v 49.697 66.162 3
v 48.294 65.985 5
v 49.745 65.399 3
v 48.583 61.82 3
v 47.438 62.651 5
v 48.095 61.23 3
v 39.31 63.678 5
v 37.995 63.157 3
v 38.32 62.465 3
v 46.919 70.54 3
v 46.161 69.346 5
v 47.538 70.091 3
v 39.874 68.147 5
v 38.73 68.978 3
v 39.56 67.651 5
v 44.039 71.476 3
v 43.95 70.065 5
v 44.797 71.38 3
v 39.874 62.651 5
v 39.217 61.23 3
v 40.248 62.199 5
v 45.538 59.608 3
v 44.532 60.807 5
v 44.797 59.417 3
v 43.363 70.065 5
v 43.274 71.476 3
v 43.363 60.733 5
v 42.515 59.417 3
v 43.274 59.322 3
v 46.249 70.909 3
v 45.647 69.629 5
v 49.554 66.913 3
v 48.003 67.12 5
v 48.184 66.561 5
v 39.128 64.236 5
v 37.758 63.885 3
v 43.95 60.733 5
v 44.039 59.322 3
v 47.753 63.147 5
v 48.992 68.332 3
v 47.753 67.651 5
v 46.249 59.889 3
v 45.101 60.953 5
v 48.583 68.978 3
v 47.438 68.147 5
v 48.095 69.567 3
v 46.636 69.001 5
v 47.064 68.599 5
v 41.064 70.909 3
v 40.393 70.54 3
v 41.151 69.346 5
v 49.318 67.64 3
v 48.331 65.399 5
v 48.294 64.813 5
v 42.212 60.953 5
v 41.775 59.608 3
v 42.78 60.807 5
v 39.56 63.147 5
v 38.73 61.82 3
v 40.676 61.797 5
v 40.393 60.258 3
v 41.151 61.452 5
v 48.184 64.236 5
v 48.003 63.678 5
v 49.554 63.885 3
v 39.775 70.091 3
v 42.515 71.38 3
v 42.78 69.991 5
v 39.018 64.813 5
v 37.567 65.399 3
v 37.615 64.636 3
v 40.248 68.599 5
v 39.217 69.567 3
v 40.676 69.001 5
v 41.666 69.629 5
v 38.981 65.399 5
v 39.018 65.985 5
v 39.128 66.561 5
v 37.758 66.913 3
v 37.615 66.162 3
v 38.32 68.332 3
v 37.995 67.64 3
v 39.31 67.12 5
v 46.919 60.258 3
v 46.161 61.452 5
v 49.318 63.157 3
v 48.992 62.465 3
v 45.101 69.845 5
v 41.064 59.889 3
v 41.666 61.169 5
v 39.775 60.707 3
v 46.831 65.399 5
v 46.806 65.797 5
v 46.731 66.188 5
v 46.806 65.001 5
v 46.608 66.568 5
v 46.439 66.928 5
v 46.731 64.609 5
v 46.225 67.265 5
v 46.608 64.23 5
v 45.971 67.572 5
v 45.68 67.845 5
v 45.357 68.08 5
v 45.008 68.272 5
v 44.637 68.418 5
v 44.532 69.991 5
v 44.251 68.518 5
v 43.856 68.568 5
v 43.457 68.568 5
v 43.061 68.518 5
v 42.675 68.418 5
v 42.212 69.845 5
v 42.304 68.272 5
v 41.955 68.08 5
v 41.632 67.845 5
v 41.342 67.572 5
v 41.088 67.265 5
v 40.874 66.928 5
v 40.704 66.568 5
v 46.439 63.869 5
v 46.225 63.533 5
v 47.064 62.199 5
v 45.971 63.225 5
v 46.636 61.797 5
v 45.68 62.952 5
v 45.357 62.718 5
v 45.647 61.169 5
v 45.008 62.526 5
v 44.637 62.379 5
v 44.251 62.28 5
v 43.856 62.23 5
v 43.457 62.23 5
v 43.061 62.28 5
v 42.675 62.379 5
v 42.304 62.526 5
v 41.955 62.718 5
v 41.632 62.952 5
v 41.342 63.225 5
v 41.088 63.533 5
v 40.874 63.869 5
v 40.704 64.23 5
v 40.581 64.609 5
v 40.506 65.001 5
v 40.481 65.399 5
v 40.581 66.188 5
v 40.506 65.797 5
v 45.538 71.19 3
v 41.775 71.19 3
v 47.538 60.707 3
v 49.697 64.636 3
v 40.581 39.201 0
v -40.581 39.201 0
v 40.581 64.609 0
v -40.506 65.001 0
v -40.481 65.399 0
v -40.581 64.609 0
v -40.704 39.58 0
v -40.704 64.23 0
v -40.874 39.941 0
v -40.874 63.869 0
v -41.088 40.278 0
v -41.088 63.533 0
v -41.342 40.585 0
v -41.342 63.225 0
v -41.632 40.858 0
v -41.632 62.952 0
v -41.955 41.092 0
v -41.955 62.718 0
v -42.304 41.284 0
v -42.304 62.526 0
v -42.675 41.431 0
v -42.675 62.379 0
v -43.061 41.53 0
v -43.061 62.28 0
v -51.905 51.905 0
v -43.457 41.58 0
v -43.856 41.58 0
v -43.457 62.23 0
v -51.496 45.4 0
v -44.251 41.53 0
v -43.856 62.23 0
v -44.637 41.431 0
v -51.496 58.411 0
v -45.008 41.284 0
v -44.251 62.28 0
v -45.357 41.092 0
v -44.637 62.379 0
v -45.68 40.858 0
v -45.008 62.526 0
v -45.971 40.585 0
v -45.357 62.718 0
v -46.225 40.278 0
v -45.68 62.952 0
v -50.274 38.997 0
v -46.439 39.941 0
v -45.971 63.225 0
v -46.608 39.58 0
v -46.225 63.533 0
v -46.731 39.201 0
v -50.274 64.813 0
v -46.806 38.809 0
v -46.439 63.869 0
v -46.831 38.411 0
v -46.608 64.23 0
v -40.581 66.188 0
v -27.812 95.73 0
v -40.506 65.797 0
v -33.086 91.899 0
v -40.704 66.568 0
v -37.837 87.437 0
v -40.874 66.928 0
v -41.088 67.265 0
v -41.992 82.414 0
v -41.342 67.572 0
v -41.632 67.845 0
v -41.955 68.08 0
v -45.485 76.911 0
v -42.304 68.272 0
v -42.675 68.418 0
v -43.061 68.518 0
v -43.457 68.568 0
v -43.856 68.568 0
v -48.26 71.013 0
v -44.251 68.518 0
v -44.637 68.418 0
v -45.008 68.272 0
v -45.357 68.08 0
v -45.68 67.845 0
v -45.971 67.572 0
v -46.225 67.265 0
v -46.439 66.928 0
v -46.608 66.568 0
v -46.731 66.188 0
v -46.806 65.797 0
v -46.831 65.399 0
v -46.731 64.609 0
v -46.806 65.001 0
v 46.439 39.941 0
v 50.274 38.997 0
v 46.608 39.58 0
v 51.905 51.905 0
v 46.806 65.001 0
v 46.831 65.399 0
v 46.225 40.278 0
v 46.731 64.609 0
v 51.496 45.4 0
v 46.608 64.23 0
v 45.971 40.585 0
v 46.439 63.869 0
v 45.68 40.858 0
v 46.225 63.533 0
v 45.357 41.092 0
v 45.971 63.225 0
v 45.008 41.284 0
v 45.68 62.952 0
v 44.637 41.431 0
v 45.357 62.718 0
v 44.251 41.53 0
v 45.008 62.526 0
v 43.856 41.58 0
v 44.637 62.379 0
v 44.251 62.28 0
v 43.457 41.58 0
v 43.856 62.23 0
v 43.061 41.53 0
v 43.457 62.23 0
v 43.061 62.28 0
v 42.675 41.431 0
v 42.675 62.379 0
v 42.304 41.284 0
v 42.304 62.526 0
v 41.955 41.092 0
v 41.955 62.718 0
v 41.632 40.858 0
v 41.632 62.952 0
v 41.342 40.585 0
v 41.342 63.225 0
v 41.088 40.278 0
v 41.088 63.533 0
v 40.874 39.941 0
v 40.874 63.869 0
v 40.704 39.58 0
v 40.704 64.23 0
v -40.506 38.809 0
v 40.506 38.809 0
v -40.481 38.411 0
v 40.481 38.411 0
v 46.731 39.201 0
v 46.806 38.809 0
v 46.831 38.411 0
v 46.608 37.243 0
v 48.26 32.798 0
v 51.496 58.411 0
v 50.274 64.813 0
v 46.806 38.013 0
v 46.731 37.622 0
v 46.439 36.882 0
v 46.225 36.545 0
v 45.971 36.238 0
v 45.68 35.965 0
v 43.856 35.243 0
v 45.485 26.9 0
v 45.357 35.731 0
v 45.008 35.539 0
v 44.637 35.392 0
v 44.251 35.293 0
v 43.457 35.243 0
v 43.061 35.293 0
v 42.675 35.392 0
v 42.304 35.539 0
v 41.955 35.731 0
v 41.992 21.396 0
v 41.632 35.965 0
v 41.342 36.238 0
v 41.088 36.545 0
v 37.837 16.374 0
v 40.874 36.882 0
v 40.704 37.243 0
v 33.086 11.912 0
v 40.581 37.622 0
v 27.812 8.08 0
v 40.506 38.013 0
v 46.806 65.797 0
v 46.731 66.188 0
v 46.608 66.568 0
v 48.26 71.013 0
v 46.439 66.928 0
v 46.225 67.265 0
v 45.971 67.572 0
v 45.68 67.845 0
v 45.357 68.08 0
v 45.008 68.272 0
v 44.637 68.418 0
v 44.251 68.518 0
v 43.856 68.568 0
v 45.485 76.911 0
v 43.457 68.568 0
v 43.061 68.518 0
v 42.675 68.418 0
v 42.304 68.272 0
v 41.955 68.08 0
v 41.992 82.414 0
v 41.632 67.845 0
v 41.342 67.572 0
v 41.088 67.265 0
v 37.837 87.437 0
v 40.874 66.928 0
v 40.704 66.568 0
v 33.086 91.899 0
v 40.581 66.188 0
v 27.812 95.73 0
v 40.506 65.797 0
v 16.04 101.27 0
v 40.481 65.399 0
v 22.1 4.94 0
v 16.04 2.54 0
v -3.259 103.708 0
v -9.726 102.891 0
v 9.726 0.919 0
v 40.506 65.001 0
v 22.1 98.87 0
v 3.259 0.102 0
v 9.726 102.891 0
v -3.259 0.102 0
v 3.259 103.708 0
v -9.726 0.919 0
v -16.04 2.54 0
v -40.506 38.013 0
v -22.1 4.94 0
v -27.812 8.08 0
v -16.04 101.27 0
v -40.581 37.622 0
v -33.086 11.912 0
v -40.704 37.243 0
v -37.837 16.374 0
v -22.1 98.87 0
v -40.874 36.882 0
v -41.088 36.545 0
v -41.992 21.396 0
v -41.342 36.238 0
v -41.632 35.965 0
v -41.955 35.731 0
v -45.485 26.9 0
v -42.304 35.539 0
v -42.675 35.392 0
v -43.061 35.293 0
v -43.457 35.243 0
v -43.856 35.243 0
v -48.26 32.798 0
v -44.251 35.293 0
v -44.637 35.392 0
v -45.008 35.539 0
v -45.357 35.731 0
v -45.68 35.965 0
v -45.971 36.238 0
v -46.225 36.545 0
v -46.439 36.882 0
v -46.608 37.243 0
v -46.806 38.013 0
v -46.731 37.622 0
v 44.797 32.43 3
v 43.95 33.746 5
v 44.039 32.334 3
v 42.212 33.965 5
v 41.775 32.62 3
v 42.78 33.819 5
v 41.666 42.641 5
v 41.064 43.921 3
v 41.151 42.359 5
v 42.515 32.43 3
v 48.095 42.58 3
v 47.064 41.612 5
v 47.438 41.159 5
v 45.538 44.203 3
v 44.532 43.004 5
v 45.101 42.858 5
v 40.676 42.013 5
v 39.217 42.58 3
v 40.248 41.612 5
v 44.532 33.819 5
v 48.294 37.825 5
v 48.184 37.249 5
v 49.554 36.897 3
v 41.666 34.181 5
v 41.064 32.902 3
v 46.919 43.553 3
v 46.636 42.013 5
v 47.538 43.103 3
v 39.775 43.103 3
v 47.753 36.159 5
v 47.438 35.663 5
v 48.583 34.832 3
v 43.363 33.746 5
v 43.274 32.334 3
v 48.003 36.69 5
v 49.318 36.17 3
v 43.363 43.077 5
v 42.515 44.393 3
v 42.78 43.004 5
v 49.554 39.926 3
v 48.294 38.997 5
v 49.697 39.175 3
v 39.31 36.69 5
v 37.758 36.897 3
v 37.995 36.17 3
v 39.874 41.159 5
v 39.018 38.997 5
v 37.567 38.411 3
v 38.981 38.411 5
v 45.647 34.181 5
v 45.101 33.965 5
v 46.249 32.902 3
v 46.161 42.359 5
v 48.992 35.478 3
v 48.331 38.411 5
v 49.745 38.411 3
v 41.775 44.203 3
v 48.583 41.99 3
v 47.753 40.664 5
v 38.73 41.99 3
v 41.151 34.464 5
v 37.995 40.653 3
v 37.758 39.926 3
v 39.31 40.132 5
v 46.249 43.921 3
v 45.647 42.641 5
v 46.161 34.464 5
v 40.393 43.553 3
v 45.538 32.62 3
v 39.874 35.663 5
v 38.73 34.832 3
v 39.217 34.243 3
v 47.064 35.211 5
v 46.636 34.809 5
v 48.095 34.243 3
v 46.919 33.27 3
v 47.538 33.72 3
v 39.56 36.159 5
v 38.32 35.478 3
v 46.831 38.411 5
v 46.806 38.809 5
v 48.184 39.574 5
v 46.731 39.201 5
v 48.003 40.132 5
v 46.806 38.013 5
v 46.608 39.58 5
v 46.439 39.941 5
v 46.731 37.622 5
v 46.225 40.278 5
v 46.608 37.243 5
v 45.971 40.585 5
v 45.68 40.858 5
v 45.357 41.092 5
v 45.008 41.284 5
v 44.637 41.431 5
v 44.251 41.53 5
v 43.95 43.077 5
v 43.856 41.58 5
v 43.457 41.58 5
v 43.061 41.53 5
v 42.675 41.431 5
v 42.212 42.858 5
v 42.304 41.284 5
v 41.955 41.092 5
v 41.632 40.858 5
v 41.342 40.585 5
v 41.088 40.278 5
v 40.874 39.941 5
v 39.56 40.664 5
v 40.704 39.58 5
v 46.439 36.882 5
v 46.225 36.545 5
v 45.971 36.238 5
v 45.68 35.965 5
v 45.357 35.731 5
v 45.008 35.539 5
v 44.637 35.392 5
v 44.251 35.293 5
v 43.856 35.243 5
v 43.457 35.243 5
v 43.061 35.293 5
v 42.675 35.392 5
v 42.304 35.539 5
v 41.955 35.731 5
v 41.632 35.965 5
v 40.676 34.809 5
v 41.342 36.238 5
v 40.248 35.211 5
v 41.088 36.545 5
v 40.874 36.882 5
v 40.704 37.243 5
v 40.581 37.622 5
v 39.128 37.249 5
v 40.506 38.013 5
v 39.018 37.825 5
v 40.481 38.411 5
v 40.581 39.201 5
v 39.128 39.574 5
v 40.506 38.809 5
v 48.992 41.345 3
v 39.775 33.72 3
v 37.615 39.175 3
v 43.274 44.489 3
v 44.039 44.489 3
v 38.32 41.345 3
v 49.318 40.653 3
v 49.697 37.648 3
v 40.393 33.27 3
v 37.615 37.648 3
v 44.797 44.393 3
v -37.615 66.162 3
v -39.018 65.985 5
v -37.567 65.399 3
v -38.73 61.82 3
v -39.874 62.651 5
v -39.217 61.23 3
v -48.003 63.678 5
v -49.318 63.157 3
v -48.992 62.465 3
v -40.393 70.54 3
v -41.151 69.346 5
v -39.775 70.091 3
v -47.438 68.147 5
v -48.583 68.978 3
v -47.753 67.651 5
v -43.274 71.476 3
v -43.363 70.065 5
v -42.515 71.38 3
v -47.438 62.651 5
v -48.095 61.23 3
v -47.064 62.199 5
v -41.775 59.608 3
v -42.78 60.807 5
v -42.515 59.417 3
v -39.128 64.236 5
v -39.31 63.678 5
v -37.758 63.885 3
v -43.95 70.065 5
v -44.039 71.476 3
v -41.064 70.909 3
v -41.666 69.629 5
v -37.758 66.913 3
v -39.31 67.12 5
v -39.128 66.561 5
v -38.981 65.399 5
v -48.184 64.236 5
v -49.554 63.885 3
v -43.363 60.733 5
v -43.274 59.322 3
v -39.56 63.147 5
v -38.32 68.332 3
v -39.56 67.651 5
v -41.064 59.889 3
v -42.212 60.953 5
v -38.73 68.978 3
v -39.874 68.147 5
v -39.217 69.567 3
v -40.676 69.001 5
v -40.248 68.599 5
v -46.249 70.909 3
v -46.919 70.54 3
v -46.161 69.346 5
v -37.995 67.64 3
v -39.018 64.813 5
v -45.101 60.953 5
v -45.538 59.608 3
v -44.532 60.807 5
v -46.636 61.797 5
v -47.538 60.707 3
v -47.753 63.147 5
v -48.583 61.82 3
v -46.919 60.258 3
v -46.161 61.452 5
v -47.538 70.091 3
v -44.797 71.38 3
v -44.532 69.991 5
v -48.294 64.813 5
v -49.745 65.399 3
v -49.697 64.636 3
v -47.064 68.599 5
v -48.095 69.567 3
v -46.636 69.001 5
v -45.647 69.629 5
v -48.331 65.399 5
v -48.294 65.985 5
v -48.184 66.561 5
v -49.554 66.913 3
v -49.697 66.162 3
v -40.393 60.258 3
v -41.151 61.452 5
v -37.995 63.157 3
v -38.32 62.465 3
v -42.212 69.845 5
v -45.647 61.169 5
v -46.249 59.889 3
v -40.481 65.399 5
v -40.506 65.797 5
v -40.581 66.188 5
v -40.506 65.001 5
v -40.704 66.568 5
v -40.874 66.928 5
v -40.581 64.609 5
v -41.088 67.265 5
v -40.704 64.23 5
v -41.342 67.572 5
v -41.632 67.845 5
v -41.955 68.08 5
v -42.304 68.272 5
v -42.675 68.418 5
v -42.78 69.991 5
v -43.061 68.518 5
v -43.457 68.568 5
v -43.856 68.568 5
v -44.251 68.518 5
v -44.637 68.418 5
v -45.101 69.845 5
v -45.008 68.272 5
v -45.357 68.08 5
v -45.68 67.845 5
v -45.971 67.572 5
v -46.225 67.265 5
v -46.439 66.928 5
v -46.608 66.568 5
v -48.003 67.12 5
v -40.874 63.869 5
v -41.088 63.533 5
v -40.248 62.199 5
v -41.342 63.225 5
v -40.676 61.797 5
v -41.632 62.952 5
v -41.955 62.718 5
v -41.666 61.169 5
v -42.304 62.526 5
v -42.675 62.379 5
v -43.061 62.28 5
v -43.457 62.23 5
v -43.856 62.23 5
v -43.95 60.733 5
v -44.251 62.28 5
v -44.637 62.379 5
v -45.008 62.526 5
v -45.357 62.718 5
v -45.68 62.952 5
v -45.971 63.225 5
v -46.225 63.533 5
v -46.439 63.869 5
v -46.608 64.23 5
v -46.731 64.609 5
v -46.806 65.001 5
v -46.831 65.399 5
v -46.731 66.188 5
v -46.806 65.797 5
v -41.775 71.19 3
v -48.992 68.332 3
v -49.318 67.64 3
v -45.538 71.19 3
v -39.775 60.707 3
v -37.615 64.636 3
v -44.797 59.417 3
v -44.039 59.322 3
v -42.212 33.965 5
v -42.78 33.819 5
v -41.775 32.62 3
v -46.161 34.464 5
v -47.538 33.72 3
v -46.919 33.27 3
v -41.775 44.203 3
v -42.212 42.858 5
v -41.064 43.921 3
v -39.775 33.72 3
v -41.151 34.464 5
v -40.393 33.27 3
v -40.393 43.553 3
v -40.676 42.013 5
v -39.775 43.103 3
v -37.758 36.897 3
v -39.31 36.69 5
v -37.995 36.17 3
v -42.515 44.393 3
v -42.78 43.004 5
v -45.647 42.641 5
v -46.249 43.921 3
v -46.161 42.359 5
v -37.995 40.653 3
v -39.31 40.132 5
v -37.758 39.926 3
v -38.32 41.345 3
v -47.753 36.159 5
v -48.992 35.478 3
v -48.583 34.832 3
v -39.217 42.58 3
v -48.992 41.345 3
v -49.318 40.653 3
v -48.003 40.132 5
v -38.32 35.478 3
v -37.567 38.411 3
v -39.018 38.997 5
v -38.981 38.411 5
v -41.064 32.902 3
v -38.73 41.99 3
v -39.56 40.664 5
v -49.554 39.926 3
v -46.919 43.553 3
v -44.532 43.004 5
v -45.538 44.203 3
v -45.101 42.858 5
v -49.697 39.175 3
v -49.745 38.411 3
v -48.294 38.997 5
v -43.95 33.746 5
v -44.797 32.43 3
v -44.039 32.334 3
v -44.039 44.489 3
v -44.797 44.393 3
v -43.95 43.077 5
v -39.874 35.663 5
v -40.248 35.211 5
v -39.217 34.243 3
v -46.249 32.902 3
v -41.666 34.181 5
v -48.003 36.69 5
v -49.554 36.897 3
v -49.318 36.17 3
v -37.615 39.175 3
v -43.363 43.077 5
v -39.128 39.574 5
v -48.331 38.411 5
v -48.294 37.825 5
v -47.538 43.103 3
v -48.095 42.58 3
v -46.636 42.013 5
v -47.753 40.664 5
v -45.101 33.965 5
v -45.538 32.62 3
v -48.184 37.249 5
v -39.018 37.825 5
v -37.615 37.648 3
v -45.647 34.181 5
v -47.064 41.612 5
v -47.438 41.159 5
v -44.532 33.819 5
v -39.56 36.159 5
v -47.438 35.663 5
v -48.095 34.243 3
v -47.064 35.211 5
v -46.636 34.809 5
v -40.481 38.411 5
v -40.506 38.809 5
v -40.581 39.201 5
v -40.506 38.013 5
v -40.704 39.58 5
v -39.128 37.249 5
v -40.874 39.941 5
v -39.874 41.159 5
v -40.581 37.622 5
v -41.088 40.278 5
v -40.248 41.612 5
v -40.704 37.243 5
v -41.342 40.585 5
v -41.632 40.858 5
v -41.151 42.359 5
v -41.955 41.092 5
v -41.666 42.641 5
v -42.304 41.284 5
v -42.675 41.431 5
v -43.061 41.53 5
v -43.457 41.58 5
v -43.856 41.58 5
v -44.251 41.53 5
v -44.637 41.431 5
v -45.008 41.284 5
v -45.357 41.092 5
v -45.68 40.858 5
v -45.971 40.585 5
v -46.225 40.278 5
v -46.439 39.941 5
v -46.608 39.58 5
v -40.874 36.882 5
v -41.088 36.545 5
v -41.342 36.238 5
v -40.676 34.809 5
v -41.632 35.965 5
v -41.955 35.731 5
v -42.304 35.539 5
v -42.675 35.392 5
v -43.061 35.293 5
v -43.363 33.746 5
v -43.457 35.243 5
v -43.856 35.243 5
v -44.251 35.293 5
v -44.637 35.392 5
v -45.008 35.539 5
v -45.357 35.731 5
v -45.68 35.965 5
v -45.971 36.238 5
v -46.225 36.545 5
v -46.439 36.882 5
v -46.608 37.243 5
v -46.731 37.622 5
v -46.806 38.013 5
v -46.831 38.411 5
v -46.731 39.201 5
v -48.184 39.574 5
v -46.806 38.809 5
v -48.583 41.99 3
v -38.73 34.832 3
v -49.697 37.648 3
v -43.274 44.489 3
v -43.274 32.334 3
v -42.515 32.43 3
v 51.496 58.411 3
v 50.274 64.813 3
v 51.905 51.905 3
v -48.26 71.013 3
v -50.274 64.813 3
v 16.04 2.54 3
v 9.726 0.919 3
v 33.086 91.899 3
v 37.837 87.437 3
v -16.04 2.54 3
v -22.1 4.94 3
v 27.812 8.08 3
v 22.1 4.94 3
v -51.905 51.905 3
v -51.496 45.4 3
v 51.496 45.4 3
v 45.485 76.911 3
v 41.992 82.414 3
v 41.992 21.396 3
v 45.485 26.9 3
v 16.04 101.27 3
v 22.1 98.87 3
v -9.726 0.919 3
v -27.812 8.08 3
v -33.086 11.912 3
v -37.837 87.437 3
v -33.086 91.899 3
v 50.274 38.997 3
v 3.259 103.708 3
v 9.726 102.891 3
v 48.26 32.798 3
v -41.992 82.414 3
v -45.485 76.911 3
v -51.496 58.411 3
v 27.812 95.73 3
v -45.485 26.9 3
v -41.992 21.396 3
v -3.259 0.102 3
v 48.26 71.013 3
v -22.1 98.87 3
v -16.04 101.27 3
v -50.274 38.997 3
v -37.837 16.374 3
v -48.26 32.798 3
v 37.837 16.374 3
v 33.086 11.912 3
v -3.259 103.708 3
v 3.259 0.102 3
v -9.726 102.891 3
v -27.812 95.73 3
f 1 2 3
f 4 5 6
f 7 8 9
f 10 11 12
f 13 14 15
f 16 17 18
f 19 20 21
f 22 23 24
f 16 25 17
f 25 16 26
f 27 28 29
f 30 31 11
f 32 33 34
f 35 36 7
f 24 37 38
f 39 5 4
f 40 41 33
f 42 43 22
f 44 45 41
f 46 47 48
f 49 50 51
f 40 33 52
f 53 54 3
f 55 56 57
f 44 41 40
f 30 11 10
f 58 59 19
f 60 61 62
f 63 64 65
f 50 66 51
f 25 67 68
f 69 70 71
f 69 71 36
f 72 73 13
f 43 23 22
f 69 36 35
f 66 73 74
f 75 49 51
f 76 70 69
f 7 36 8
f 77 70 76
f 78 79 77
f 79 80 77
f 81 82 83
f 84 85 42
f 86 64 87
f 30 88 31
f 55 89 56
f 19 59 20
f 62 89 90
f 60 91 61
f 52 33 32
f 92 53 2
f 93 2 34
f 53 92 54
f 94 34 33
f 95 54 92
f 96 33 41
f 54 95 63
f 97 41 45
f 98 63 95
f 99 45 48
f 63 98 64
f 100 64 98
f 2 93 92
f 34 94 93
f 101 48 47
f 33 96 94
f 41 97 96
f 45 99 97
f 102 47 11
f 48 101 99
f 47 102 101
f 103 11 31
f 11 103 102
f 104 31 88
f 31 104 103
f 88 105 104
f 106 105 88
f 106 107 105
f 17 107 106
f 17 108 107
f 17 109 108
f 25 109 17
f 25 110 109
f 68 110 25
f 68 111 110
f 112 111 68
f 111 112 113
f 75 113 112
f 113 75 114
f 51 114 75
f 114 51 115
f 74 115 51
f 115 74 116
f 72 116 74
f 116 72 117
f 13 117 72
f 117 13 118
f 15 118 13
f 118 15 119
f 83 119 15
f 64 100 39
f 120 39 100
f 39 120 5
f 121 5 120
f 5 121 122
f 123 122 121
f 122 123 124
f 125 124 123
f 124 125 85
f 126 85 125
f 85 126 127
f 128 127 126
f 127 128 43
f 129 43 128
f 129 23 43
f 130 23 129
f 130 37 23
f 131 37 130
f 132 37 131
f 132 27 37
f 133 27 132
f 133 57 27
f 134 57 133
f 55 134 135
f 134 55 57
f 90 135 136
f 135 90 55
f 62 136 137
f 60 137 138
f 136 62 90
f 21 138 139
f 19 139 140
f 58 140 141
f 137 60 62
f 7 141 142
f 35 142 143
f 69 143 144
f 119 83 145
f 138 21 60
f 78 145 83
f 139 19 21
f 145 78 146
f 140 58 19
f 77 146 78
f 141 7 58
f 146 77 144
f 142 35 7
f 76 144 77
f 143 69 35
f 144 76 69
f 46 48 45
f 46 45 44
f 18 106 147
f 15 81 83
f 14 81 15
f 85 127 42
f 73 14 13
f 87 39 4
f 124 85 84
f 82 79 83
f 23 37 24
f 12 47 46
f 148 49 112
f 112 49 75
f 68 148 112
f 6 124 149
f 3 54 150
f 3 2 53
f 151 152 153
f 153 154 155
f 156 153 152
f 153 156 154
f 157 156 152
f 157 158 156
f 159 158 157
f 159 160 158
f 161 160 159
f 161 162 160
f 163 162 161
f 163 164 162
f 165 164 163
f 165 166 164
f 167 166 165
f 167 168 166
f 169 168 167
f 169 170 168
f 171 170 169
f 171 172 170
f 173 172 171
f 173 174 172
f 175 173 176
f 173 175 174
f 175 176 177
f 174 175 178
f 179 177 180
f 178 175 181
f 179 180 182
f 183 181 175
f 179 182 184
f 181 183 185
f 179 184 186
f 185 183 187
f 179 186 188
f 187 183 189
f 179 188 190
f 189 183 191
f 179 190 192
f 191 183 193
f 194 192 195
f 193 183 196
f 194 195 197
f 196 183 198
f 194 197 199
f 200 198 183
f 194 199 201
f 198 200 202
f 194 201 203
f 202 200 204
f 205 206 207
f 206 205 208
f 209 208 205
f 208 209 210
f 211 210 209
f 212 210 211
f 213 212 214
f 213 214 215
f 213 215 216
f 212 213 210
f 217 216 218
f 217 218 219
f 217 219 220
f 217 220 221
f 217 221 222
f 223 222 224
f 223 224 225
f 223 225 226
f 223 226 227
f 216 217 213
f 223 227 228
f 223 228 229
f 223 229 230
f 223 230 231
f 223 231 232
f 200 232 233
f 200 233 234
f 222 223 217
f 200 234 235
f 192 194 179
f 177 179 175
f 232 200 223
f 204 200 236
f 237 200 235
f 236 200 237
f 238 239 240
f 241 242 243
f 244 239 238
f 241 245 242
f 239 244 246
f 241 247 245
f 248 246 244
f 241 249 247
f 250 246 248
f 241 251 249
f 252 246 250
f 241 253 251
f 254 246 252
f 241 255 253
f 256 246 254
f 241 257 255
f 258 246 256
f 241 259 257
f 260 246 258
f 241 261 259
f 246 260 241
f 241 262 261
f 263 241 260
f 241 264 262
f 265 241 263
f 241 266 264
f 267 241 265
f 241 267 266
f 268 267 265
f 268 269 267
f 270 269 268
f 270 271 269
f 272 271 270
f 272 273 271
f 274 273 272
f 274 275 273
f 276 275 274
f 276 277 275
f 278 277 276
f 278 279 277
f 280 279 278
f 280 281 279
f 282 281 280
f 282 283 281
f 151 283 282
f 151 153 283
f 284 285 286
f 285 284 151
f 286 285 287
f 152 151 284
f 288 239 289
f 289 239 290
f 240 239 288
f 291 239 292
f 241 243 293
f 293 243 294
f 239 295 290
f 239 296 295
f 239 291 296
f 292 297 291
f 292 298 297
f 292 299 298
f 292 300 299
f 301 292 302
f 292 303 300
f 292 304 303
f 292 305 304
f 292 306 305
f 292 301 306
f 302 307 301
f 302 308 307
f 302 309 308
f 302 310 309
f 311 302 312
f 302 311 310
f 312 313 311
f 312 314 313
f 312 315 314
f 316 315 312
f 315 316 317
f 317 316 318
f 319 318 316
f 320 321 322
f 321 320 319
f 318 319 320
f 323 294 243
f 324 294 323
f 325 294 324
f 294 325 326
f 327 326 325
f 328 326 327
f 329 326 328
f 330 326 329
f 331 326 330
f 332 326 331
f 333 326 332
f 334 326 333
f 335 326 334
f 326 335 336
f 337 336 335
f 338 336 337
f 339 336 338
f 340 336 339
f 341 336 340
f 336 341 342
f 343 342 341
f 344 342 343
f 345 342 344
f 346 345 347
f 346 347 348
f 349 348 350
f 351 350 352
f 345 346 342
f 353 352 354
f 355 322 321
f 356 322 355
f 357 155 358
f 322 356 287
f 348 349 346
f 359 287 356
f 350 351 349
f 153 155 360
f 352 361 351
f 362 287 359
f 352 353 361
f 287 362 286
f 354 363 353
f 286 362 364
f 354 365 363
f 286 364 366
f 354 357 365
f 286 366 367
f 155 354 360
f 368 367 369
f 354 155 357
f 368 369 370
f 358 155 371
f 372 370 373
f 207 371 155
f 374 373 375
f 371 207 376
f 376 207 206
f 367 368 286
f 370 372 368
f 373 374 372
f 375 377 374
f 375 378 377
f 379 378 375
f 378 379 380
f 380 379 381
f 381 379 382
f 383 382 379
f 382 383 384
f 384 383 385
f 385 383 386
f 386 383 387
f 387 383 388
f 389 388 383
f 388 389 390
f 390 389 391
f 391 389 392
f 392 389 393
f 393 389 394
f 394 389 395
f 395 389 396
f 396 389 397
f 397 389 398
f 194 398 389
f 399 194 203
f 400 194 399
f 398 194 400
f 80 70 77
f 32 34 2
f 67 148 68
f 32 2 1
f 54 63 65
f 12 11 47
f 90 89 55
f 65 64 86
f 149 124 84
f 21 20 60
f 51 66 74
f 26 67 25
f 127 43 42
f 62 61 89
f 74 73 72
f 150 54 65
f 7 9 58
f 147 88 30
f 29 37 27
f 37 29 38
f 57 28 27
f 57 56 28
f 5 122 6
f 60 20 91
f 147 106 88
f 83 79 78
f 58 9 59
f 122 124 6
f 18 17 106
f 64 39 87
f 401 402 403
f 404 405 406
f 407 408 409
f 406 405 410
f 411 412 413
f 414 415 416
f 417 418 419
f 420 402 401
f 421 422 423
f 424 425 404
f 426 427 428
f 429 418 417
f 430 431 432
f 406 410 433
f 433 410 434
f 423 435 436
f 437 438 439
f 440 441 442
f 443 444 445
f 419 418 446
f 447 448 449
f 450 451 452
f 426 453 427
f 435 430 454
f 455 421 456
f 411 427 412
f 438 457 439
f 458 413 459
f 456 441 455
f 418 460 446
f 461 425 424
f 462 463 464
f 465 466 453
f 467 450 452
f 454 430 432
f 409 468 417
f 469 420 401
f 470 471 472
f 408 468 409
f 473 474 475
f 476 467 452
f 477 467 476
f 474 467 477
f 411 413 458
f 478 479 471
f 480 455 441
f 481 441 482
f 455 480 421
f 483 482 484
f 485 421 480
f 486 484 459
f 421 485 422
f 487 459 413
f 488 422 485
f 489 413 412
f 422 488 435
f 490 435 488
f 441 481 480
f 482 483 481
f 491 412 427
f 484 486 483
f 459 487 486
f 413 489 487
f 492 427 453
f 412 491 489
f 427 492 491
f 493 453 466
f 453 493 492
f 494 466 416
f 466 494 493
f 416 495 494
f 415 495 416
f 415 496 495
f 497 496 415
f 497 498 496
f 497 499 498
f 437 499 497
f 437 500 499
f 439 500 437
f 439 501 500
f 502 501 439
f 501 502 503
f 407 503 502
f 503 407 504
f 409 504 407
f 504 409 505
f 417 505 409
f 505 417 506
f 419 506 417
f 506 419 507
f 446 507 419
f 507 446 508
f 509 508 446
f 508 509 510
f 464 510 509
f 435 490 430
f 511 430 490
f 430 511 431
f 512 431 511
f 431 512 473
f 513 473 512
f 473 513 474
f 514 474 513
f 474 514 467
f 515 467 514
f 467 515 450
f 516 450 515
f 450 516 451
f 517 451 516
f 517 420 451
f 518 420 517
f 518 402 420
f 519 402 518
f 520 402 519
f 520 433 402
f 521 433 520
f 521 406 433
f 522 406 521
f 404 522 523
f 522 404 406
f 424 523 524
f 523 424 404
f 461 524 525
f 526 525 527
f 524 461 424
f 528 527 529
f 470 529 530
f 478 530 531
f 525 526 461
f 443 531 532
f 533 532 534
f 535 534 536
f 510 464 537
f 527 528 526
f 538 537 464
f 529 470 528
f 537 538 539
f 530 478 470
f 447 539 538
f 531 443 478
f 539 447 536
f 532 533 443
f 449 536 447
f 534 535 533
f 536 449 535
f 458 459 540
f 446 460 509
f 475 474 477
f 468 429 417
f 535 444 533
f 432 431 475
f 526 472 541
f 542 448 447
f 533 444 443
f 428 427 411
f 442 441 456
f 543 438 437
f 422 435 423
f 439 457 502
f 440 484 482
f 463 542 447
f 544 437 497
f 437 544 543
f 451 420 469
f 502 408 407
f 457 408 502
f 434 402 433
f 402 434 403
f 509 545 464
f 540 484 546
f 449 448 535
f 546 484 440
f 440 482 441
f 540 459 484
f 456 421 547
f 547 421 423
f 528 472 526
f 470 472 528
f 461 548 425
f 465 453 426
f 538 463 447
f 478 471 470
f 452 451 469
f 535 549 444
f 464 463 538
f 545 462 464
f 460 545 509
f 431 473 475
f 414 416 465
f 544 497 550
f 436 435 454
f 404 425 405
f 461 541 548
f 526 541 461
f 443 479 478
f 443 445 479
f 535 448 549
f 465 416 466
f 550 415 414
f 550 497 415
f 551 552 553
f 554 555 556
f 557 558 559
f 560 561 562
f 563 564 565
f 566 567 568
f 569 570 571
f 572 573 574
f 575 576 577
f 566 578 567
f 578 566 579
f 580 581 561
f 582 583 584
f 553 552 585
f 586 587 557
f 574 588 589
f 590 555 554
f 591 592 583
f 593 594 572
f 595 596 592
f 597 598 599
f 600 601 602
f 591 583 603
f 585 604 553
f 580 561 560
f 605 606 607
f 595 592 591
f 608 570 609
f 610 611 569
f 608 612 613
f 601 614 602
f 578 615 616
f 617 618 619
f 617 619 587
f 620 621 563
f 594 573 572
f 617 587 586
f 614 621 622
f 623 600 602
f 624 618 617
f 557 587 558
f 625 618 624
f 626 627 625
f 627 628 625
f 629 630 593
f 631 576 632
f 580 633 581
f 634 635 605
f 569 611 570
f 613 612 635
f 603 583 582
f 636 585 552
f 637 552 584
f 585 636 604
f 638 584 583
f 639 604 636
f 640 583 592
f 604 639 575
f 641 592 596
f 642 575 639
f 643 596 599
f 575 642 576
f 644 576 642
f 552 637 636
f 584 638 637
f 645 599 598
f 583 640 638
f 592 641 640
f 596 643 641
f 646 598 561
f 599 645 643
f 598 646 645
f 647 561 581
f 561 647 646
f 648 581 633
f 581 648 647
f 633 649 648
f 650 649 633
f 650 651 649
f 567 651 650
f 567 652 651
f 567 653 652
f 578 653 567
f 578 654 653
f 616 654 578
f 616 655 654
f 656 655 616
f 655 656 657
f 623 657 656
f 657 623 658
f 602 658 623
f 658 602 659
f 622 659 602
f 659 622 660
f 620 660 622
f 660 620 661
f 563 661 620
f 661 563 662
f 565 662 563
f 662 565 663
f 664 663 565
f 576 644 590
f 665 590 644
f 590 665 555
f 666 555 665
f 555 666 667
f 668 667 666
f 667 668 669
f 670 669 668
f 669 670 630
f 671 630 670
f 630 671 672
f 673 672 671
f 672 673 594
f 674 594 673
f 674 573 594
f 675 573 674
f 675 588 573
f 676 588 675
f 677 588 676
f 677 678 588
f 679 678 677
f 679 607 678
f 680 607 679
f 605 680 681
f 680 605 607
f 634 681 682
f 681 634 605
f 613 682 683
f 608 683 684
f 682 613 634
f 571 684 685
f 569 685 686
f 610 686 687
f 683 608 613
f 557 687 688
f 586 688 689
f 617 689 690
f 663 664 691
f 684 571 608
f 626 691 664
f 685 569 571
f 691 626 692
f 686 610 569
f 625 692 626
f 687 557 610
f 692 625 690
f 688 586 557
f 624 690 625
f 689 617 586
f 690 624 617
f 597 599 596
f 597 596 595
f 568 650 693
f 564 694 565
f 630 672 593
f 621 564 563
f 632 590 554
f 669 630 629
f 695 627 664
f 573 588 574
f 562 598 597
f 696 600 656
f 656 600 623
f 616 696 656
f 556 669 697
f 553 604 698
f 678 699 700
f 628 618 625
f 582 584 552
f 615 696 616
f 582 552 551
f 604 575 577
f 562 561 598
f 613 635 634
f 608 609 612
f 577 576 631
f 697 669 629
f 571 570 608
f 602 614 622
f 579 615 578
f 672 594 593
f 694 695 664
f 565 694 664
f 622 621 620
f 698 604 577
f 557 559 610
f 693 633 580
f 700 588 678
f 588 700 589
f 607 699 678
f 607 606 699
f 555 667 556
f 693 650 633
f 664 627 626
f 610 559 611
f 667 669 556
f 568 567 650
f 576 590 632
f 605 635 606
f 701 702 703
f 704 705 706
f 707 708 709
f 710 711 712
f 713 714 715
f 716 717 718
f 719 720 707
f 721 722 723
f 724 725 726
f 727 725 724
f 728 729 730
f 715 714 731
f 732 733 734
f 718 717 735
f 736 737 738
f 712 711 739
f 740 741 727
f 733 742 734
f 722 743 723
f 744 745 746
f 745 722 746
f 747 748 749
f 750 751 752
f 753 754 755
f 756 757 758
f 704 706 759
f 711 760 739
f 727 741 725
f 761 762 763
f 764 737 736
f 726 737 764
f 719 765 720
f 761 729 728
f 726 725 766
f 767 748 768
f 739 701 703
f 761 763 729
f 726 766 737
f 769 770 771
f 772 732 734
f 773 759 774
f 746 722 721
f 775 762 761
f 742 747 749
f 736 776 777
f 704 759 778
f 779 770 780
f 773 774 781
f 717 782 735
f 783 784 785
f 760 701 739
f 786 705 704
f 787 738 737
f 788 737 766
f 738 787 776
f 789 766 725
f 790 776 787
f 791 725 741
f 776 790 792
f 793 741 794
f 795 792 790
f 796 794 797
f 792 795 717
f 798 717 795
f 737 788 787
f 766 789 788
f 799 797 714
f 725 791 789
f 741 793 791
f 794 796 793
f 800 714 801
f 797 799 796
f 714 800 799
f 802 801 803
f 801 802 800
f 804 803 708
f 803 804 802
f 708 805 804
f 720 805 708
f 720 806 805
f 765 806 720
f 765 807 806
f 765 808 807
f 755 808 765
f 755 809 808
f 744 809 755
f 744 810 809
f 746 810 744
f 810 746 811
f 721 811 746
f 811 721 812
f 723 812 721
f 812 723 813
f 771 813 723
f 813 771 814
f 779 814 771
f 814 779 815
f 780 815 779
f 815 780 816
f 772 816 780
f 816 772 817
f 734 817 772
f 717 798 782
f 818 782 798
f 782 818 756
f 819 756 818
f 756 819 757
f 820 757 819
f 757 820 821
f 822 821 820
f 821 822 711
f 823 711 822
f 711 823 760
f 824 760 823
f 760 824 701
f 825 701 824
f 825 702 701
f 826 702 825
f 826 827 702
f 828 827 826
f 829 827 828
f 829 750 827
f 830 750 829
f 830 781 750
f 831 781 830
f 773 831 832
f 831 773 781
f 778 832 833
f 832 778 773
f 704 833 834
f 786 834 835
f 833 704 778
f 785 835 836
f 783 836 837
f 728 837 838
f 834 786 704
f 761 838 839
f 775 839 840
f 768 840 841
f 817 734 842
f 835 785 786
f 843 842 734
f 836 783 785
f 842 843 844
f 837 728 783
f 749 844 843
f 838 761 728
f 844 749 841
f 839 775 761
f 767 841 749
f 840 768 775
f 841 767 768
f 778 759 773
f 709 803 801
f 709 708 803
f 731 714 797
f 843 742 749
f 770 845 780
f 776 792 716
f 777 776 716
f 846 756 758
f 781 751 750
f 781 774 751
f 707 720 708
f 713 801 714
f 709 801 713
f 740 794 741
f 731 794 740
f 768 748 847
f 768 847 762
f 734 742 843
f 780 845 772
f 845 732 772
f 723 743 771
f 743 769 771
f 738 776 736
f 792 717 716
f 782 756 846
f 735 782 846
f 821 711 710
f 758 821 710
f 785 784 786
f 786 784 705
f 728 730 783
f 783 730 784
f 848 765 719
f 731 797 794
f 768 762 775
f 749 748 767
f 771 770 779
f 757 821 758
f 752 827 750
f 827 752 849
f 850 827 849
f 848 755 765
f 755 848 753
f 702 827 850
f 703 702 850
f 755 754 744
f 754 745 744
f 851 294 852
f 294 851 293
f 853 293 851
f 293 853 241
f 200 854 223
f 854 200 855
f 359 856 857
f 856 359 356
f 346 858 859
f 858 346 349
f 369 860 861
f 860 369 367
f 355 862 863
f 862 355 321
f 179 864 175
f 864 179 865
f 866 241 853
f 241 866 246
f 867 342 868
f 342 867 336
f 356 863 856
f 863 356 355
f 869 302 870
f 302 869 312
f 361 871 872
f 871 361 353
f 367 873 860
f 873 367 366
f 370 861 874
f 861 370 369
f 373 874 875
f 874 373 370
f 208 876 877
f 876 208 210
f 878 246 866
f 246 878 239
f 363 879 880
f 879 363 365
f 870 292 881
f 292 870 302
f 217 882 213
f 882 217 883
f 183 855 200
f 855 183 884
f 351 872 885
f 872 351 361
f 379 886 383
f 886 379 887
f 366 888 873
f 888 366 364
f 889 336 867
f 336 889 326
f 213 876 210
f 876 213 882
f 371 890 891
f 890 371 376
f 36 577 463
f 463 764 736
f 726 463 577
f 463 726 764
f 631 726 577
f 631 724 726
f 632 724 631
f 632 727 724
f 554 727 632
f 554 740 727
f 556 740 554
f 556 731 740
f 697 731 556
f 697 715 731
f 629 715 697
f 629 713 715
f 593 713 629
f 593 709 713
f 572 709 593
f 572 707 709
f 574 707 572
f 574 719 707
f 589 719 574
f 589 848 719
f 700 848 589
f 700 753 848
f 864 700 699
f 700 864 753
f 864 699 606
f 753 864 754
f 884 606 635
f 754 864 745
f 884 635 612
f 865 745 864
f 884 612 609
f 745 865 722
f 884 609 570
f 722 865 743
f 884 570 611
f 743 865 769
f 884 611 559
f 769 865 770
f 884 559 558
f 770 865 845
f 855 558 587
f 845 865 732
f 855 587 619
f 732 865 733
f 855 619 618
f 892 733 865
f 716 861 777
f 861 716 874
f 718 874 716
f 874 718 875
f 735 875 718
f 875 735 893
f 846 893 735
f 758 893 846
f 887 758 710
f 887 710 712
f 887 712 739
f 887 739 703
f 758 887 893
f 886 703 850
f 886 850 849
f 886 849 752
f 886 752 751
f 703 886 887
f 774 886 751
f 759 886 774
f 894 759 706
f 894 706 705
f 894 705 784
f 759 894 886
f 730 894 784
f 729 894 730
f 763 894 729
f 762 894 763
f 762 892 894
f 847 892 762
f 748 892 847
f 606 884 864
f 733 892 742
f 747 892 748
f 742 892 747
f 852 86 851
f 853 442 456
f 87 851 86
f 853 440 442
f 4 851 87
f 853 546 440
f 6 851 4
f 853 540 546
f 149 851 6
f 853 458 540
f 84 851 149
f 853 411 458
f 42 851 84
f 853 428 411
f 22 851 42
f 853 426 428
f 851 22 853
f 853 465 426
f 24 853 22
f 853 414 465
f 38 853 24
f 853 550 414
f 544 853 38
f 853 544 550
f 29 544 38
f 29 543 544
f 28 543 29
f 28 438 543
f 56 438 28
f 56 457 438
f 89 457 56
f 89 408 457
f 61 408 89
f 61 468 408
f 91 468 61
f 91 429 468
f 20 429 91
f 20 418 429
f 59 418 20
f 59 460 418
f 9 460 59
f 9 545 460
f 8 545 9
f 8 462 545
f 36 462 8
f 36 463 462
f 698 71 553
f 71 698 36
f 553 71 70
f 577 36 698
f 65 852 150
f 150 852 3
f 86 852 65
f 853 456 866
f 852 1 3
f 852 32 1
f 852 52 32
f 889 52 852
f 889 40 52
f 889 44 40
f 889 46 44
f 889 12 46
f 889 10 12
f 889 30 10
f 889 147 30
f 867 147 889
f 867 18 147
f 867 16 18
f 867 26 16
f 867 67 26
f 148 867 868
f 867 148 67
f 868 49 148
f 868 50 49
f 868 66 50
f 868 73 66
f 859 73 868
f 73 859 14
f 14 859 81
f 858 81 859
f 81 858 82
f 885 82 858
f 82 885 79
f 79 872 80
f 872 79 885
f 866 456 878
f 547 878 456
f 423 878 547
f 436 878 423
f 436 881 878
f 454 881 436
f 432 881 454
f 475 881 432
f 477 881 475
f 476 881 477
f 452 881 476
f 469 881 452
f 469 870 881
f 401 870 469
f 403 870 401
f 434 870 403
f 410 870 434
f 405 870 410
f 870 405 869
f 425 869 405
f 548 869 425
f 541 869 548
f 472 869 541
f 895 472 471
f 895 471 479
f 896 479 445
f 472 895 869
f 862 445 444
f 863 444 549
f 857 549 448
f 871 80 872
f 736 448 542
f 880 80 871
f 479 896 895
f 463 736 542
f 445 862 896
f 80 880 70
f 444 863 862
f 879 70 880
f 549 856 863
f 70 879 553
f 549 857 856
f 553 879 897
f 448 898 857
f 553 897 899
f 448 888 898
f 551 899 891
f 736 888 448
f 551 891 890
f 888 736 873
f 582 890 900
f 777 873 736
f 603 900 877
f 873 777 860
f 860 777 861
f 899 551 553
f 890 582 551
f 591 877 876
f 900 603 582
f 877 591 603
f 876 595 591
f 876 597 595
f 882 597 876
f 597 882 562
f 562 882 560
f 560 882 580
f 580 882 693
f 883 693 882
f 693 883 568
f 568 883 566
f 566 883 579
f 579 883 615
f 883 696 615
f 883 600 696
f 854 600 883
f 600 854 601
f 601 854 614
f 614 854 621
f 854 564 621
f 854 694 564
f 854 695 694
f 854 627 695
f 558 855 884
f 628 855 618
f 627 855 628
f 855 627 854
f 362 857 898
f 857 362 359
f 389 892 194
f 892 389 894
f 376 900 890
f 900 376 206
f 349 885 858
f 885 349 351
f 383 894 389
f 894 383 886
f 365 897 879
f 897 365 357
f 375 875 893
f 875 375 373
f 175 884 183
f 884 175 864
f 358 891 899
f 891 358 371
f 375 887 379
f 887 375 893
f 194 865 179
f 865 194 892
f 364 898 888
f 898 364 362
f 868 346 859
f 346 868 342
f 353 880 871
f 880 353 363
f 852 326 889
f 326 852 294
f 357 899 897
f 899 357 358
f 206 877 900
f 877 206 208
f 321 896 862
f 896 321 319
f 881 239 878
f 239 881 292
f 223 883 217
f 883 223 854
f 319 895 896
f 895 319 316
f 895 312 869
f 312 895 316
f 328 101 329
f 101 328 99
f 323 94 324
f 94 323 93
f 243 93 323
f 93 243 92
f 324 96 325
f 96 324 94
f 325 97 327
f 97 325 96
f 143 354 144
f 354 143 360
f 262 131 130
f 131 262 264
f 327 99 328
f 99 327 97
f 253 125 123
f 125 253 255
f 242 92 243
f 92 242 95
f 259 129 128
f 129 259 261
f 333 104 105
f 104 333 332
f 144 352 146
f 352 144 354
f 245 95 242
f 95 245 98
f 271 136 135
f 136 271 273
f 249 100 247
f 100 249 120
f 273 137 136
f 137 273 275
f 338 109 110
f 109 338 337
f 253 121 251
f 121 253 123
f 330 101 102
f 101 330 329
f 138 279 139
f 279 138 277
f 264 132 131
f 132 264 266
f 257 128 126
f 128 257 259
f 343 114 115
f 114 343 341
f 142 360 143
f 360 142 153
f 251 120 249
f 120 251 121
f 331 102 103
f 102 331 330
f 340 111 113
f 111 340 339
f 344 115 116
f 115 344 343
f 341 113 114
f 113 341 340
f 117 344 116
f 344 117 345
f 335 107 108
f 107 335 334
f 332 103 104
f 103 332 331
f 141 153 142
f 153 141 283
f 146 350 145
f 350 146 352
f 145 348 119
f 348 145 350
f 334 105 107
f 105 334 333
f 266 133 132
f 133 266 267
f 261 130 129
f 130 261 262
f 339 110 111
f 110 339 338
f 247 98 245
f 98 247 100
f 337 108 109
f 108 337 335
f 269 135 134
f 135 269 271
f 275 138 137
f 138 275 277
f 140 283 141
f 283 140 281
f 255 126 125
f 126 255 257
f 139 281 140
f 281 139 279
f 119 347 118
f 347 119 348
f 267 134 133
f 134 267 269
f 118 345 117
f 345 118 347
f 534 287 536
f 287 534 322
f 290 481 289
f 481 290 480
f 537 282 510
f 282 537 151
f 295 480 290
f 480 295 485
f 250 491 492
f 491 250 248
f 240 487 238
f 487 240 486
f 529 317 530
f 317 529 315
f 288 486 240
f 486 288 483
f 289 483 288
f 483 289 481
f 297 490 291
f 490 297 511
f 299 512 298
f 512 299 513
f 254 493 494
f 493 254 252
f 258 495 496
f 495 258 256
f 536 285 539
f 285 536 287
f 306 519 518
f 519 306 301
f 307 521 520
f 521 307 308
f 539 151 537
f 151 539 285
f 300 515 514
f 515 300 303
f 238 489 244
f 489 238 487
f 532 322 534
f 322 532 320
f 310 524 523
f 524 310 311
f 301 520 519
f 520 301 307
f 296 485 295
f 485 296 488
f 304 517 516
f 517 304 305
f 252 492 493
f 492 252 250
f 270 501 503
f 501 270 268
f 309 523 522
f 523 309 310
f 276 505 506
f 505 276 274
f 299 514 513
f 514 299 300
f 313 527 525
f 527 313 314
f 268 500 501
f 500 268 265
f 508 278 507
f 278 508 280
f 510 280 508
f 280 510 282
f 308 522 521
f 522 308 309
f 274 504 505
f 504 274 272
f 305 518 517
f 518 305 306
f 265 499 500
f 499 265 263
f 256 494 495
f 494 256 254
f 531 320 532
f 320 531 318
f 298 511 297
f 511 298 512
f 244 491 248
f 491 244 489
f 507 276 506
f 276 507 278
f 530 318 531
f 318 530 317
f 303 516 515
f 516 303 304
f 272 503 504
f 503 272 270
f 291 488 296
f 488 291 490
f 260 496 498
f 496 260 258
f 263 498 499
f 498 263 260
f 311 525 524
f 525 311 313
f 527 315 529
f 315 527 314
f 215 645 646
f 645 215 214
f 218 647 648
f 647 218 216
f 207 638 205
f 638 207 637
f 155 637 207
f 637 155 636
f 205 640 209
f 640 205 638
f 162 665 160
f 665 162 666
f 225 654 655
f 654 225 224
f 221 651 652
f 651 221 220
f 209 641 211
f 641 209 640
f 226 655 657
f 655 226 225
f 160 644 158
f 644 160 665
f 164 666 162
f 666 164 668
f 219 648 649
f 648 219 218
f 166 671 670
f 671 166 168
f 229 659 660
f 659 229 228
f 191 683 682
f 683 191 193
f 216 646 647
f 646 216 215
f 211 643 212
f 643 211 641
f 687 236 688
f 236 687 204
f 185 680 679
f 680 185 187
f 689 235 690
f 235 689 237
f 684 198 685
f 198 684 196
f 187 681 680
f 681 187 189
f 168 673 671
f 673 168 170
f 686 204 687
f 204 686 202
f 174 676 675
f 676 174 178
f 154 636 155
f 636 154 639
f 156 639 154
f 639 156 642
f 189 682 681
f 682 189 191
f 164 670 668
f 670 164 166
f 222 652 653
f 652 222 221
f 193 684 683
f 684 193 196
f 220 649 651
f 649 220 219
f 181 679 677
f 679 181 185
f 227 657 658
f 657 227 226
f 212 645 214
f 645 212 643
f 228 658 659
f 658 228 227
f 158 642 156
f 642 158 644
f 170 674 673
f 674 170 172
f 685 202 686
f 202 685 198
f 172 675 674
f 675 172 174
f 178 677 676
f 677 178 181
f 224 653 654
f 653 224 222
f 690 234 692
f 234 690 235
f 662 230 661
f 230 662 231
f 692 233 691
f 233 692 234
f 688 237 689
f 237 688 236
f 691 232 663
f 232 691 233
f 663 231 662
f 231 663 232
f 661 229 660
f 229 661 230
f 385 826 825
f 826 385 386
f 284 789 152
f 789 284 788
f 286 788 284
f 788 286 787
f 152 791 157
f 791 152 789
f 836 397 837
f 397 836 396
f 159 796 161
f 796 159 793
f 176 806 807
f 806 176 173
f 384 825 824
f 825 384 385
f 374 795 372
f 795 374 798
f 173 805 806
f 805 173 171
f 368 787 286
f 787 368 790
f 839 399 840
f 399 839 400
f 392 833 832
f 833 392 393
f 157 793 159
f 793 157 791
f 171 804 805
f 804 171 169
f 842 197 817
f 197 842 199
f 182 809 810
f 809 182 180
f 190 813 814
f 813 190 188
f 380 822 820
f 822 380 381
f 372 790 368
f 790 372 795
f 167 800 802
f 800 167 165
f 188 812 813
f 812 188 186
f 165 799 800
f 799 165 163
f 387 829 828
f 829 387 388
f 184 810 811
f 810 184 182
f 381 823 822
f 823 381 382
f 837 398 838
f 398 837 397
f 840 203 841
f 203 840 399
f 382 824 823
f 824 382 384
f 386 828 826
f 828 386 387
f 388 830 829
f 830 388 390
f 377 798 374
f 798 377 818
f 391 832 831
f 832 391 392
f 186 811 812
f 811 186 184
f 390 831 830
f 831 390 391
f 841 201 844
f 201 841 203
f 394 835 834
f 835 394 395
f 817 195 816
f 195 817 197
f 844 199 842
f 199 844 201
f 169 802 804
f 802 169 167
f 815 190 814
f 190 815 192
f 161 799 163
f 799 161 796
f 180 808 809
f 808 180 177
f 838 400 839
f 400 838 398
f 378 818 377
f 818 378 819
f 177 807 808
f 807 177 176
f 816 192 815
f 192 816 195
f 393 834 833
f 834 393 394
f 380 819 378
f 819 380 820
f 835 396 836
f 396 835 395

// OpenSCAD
module light(s=0,bt=3,test=[1,-1]) {
    $fn=50;
    x=(3+7/16)*25.4/2;
    y=(1+1/16)*25.4/2;
    ct=2;
    tt=bt+ct;
    d=6.35;
    d2=d+3;
    d1=cos(45)*ct*2+d2;
    ld=sqrt(pow(x,2)+pow(y,2))*2+d1*1.02;
    
    echo(x,y,d1,ld);
    translate([0,ld/2,0]) {
        if (s==2) {
            cylinder(d=ld,h=bt);
        }
        if (s==1) {
                //translate([0,0,bt/2]) cube([x*2+d1,y*2+d1,bt],true);
            
                for(xo=test) for (yo=test) hull() {
                    translate([x*xo,y*yo,bt-0.001]) cylinder(d1=d1,d2=d2,h=tt-bt+0.001);
                    translate([x*xo,y*yo,0])cylinder(d=d1,h=bt);
                }
        }
        if (s==0) {
            for(xo=test) for (yo=test) {
                translate([x*xo,y*yo,-0.001])cylinder(d=d,h=tt+0.002);
            }
        }
    }
}

difference() {
    union() {
        light(2);
        light(1);
    }
    light(0);
}
        
